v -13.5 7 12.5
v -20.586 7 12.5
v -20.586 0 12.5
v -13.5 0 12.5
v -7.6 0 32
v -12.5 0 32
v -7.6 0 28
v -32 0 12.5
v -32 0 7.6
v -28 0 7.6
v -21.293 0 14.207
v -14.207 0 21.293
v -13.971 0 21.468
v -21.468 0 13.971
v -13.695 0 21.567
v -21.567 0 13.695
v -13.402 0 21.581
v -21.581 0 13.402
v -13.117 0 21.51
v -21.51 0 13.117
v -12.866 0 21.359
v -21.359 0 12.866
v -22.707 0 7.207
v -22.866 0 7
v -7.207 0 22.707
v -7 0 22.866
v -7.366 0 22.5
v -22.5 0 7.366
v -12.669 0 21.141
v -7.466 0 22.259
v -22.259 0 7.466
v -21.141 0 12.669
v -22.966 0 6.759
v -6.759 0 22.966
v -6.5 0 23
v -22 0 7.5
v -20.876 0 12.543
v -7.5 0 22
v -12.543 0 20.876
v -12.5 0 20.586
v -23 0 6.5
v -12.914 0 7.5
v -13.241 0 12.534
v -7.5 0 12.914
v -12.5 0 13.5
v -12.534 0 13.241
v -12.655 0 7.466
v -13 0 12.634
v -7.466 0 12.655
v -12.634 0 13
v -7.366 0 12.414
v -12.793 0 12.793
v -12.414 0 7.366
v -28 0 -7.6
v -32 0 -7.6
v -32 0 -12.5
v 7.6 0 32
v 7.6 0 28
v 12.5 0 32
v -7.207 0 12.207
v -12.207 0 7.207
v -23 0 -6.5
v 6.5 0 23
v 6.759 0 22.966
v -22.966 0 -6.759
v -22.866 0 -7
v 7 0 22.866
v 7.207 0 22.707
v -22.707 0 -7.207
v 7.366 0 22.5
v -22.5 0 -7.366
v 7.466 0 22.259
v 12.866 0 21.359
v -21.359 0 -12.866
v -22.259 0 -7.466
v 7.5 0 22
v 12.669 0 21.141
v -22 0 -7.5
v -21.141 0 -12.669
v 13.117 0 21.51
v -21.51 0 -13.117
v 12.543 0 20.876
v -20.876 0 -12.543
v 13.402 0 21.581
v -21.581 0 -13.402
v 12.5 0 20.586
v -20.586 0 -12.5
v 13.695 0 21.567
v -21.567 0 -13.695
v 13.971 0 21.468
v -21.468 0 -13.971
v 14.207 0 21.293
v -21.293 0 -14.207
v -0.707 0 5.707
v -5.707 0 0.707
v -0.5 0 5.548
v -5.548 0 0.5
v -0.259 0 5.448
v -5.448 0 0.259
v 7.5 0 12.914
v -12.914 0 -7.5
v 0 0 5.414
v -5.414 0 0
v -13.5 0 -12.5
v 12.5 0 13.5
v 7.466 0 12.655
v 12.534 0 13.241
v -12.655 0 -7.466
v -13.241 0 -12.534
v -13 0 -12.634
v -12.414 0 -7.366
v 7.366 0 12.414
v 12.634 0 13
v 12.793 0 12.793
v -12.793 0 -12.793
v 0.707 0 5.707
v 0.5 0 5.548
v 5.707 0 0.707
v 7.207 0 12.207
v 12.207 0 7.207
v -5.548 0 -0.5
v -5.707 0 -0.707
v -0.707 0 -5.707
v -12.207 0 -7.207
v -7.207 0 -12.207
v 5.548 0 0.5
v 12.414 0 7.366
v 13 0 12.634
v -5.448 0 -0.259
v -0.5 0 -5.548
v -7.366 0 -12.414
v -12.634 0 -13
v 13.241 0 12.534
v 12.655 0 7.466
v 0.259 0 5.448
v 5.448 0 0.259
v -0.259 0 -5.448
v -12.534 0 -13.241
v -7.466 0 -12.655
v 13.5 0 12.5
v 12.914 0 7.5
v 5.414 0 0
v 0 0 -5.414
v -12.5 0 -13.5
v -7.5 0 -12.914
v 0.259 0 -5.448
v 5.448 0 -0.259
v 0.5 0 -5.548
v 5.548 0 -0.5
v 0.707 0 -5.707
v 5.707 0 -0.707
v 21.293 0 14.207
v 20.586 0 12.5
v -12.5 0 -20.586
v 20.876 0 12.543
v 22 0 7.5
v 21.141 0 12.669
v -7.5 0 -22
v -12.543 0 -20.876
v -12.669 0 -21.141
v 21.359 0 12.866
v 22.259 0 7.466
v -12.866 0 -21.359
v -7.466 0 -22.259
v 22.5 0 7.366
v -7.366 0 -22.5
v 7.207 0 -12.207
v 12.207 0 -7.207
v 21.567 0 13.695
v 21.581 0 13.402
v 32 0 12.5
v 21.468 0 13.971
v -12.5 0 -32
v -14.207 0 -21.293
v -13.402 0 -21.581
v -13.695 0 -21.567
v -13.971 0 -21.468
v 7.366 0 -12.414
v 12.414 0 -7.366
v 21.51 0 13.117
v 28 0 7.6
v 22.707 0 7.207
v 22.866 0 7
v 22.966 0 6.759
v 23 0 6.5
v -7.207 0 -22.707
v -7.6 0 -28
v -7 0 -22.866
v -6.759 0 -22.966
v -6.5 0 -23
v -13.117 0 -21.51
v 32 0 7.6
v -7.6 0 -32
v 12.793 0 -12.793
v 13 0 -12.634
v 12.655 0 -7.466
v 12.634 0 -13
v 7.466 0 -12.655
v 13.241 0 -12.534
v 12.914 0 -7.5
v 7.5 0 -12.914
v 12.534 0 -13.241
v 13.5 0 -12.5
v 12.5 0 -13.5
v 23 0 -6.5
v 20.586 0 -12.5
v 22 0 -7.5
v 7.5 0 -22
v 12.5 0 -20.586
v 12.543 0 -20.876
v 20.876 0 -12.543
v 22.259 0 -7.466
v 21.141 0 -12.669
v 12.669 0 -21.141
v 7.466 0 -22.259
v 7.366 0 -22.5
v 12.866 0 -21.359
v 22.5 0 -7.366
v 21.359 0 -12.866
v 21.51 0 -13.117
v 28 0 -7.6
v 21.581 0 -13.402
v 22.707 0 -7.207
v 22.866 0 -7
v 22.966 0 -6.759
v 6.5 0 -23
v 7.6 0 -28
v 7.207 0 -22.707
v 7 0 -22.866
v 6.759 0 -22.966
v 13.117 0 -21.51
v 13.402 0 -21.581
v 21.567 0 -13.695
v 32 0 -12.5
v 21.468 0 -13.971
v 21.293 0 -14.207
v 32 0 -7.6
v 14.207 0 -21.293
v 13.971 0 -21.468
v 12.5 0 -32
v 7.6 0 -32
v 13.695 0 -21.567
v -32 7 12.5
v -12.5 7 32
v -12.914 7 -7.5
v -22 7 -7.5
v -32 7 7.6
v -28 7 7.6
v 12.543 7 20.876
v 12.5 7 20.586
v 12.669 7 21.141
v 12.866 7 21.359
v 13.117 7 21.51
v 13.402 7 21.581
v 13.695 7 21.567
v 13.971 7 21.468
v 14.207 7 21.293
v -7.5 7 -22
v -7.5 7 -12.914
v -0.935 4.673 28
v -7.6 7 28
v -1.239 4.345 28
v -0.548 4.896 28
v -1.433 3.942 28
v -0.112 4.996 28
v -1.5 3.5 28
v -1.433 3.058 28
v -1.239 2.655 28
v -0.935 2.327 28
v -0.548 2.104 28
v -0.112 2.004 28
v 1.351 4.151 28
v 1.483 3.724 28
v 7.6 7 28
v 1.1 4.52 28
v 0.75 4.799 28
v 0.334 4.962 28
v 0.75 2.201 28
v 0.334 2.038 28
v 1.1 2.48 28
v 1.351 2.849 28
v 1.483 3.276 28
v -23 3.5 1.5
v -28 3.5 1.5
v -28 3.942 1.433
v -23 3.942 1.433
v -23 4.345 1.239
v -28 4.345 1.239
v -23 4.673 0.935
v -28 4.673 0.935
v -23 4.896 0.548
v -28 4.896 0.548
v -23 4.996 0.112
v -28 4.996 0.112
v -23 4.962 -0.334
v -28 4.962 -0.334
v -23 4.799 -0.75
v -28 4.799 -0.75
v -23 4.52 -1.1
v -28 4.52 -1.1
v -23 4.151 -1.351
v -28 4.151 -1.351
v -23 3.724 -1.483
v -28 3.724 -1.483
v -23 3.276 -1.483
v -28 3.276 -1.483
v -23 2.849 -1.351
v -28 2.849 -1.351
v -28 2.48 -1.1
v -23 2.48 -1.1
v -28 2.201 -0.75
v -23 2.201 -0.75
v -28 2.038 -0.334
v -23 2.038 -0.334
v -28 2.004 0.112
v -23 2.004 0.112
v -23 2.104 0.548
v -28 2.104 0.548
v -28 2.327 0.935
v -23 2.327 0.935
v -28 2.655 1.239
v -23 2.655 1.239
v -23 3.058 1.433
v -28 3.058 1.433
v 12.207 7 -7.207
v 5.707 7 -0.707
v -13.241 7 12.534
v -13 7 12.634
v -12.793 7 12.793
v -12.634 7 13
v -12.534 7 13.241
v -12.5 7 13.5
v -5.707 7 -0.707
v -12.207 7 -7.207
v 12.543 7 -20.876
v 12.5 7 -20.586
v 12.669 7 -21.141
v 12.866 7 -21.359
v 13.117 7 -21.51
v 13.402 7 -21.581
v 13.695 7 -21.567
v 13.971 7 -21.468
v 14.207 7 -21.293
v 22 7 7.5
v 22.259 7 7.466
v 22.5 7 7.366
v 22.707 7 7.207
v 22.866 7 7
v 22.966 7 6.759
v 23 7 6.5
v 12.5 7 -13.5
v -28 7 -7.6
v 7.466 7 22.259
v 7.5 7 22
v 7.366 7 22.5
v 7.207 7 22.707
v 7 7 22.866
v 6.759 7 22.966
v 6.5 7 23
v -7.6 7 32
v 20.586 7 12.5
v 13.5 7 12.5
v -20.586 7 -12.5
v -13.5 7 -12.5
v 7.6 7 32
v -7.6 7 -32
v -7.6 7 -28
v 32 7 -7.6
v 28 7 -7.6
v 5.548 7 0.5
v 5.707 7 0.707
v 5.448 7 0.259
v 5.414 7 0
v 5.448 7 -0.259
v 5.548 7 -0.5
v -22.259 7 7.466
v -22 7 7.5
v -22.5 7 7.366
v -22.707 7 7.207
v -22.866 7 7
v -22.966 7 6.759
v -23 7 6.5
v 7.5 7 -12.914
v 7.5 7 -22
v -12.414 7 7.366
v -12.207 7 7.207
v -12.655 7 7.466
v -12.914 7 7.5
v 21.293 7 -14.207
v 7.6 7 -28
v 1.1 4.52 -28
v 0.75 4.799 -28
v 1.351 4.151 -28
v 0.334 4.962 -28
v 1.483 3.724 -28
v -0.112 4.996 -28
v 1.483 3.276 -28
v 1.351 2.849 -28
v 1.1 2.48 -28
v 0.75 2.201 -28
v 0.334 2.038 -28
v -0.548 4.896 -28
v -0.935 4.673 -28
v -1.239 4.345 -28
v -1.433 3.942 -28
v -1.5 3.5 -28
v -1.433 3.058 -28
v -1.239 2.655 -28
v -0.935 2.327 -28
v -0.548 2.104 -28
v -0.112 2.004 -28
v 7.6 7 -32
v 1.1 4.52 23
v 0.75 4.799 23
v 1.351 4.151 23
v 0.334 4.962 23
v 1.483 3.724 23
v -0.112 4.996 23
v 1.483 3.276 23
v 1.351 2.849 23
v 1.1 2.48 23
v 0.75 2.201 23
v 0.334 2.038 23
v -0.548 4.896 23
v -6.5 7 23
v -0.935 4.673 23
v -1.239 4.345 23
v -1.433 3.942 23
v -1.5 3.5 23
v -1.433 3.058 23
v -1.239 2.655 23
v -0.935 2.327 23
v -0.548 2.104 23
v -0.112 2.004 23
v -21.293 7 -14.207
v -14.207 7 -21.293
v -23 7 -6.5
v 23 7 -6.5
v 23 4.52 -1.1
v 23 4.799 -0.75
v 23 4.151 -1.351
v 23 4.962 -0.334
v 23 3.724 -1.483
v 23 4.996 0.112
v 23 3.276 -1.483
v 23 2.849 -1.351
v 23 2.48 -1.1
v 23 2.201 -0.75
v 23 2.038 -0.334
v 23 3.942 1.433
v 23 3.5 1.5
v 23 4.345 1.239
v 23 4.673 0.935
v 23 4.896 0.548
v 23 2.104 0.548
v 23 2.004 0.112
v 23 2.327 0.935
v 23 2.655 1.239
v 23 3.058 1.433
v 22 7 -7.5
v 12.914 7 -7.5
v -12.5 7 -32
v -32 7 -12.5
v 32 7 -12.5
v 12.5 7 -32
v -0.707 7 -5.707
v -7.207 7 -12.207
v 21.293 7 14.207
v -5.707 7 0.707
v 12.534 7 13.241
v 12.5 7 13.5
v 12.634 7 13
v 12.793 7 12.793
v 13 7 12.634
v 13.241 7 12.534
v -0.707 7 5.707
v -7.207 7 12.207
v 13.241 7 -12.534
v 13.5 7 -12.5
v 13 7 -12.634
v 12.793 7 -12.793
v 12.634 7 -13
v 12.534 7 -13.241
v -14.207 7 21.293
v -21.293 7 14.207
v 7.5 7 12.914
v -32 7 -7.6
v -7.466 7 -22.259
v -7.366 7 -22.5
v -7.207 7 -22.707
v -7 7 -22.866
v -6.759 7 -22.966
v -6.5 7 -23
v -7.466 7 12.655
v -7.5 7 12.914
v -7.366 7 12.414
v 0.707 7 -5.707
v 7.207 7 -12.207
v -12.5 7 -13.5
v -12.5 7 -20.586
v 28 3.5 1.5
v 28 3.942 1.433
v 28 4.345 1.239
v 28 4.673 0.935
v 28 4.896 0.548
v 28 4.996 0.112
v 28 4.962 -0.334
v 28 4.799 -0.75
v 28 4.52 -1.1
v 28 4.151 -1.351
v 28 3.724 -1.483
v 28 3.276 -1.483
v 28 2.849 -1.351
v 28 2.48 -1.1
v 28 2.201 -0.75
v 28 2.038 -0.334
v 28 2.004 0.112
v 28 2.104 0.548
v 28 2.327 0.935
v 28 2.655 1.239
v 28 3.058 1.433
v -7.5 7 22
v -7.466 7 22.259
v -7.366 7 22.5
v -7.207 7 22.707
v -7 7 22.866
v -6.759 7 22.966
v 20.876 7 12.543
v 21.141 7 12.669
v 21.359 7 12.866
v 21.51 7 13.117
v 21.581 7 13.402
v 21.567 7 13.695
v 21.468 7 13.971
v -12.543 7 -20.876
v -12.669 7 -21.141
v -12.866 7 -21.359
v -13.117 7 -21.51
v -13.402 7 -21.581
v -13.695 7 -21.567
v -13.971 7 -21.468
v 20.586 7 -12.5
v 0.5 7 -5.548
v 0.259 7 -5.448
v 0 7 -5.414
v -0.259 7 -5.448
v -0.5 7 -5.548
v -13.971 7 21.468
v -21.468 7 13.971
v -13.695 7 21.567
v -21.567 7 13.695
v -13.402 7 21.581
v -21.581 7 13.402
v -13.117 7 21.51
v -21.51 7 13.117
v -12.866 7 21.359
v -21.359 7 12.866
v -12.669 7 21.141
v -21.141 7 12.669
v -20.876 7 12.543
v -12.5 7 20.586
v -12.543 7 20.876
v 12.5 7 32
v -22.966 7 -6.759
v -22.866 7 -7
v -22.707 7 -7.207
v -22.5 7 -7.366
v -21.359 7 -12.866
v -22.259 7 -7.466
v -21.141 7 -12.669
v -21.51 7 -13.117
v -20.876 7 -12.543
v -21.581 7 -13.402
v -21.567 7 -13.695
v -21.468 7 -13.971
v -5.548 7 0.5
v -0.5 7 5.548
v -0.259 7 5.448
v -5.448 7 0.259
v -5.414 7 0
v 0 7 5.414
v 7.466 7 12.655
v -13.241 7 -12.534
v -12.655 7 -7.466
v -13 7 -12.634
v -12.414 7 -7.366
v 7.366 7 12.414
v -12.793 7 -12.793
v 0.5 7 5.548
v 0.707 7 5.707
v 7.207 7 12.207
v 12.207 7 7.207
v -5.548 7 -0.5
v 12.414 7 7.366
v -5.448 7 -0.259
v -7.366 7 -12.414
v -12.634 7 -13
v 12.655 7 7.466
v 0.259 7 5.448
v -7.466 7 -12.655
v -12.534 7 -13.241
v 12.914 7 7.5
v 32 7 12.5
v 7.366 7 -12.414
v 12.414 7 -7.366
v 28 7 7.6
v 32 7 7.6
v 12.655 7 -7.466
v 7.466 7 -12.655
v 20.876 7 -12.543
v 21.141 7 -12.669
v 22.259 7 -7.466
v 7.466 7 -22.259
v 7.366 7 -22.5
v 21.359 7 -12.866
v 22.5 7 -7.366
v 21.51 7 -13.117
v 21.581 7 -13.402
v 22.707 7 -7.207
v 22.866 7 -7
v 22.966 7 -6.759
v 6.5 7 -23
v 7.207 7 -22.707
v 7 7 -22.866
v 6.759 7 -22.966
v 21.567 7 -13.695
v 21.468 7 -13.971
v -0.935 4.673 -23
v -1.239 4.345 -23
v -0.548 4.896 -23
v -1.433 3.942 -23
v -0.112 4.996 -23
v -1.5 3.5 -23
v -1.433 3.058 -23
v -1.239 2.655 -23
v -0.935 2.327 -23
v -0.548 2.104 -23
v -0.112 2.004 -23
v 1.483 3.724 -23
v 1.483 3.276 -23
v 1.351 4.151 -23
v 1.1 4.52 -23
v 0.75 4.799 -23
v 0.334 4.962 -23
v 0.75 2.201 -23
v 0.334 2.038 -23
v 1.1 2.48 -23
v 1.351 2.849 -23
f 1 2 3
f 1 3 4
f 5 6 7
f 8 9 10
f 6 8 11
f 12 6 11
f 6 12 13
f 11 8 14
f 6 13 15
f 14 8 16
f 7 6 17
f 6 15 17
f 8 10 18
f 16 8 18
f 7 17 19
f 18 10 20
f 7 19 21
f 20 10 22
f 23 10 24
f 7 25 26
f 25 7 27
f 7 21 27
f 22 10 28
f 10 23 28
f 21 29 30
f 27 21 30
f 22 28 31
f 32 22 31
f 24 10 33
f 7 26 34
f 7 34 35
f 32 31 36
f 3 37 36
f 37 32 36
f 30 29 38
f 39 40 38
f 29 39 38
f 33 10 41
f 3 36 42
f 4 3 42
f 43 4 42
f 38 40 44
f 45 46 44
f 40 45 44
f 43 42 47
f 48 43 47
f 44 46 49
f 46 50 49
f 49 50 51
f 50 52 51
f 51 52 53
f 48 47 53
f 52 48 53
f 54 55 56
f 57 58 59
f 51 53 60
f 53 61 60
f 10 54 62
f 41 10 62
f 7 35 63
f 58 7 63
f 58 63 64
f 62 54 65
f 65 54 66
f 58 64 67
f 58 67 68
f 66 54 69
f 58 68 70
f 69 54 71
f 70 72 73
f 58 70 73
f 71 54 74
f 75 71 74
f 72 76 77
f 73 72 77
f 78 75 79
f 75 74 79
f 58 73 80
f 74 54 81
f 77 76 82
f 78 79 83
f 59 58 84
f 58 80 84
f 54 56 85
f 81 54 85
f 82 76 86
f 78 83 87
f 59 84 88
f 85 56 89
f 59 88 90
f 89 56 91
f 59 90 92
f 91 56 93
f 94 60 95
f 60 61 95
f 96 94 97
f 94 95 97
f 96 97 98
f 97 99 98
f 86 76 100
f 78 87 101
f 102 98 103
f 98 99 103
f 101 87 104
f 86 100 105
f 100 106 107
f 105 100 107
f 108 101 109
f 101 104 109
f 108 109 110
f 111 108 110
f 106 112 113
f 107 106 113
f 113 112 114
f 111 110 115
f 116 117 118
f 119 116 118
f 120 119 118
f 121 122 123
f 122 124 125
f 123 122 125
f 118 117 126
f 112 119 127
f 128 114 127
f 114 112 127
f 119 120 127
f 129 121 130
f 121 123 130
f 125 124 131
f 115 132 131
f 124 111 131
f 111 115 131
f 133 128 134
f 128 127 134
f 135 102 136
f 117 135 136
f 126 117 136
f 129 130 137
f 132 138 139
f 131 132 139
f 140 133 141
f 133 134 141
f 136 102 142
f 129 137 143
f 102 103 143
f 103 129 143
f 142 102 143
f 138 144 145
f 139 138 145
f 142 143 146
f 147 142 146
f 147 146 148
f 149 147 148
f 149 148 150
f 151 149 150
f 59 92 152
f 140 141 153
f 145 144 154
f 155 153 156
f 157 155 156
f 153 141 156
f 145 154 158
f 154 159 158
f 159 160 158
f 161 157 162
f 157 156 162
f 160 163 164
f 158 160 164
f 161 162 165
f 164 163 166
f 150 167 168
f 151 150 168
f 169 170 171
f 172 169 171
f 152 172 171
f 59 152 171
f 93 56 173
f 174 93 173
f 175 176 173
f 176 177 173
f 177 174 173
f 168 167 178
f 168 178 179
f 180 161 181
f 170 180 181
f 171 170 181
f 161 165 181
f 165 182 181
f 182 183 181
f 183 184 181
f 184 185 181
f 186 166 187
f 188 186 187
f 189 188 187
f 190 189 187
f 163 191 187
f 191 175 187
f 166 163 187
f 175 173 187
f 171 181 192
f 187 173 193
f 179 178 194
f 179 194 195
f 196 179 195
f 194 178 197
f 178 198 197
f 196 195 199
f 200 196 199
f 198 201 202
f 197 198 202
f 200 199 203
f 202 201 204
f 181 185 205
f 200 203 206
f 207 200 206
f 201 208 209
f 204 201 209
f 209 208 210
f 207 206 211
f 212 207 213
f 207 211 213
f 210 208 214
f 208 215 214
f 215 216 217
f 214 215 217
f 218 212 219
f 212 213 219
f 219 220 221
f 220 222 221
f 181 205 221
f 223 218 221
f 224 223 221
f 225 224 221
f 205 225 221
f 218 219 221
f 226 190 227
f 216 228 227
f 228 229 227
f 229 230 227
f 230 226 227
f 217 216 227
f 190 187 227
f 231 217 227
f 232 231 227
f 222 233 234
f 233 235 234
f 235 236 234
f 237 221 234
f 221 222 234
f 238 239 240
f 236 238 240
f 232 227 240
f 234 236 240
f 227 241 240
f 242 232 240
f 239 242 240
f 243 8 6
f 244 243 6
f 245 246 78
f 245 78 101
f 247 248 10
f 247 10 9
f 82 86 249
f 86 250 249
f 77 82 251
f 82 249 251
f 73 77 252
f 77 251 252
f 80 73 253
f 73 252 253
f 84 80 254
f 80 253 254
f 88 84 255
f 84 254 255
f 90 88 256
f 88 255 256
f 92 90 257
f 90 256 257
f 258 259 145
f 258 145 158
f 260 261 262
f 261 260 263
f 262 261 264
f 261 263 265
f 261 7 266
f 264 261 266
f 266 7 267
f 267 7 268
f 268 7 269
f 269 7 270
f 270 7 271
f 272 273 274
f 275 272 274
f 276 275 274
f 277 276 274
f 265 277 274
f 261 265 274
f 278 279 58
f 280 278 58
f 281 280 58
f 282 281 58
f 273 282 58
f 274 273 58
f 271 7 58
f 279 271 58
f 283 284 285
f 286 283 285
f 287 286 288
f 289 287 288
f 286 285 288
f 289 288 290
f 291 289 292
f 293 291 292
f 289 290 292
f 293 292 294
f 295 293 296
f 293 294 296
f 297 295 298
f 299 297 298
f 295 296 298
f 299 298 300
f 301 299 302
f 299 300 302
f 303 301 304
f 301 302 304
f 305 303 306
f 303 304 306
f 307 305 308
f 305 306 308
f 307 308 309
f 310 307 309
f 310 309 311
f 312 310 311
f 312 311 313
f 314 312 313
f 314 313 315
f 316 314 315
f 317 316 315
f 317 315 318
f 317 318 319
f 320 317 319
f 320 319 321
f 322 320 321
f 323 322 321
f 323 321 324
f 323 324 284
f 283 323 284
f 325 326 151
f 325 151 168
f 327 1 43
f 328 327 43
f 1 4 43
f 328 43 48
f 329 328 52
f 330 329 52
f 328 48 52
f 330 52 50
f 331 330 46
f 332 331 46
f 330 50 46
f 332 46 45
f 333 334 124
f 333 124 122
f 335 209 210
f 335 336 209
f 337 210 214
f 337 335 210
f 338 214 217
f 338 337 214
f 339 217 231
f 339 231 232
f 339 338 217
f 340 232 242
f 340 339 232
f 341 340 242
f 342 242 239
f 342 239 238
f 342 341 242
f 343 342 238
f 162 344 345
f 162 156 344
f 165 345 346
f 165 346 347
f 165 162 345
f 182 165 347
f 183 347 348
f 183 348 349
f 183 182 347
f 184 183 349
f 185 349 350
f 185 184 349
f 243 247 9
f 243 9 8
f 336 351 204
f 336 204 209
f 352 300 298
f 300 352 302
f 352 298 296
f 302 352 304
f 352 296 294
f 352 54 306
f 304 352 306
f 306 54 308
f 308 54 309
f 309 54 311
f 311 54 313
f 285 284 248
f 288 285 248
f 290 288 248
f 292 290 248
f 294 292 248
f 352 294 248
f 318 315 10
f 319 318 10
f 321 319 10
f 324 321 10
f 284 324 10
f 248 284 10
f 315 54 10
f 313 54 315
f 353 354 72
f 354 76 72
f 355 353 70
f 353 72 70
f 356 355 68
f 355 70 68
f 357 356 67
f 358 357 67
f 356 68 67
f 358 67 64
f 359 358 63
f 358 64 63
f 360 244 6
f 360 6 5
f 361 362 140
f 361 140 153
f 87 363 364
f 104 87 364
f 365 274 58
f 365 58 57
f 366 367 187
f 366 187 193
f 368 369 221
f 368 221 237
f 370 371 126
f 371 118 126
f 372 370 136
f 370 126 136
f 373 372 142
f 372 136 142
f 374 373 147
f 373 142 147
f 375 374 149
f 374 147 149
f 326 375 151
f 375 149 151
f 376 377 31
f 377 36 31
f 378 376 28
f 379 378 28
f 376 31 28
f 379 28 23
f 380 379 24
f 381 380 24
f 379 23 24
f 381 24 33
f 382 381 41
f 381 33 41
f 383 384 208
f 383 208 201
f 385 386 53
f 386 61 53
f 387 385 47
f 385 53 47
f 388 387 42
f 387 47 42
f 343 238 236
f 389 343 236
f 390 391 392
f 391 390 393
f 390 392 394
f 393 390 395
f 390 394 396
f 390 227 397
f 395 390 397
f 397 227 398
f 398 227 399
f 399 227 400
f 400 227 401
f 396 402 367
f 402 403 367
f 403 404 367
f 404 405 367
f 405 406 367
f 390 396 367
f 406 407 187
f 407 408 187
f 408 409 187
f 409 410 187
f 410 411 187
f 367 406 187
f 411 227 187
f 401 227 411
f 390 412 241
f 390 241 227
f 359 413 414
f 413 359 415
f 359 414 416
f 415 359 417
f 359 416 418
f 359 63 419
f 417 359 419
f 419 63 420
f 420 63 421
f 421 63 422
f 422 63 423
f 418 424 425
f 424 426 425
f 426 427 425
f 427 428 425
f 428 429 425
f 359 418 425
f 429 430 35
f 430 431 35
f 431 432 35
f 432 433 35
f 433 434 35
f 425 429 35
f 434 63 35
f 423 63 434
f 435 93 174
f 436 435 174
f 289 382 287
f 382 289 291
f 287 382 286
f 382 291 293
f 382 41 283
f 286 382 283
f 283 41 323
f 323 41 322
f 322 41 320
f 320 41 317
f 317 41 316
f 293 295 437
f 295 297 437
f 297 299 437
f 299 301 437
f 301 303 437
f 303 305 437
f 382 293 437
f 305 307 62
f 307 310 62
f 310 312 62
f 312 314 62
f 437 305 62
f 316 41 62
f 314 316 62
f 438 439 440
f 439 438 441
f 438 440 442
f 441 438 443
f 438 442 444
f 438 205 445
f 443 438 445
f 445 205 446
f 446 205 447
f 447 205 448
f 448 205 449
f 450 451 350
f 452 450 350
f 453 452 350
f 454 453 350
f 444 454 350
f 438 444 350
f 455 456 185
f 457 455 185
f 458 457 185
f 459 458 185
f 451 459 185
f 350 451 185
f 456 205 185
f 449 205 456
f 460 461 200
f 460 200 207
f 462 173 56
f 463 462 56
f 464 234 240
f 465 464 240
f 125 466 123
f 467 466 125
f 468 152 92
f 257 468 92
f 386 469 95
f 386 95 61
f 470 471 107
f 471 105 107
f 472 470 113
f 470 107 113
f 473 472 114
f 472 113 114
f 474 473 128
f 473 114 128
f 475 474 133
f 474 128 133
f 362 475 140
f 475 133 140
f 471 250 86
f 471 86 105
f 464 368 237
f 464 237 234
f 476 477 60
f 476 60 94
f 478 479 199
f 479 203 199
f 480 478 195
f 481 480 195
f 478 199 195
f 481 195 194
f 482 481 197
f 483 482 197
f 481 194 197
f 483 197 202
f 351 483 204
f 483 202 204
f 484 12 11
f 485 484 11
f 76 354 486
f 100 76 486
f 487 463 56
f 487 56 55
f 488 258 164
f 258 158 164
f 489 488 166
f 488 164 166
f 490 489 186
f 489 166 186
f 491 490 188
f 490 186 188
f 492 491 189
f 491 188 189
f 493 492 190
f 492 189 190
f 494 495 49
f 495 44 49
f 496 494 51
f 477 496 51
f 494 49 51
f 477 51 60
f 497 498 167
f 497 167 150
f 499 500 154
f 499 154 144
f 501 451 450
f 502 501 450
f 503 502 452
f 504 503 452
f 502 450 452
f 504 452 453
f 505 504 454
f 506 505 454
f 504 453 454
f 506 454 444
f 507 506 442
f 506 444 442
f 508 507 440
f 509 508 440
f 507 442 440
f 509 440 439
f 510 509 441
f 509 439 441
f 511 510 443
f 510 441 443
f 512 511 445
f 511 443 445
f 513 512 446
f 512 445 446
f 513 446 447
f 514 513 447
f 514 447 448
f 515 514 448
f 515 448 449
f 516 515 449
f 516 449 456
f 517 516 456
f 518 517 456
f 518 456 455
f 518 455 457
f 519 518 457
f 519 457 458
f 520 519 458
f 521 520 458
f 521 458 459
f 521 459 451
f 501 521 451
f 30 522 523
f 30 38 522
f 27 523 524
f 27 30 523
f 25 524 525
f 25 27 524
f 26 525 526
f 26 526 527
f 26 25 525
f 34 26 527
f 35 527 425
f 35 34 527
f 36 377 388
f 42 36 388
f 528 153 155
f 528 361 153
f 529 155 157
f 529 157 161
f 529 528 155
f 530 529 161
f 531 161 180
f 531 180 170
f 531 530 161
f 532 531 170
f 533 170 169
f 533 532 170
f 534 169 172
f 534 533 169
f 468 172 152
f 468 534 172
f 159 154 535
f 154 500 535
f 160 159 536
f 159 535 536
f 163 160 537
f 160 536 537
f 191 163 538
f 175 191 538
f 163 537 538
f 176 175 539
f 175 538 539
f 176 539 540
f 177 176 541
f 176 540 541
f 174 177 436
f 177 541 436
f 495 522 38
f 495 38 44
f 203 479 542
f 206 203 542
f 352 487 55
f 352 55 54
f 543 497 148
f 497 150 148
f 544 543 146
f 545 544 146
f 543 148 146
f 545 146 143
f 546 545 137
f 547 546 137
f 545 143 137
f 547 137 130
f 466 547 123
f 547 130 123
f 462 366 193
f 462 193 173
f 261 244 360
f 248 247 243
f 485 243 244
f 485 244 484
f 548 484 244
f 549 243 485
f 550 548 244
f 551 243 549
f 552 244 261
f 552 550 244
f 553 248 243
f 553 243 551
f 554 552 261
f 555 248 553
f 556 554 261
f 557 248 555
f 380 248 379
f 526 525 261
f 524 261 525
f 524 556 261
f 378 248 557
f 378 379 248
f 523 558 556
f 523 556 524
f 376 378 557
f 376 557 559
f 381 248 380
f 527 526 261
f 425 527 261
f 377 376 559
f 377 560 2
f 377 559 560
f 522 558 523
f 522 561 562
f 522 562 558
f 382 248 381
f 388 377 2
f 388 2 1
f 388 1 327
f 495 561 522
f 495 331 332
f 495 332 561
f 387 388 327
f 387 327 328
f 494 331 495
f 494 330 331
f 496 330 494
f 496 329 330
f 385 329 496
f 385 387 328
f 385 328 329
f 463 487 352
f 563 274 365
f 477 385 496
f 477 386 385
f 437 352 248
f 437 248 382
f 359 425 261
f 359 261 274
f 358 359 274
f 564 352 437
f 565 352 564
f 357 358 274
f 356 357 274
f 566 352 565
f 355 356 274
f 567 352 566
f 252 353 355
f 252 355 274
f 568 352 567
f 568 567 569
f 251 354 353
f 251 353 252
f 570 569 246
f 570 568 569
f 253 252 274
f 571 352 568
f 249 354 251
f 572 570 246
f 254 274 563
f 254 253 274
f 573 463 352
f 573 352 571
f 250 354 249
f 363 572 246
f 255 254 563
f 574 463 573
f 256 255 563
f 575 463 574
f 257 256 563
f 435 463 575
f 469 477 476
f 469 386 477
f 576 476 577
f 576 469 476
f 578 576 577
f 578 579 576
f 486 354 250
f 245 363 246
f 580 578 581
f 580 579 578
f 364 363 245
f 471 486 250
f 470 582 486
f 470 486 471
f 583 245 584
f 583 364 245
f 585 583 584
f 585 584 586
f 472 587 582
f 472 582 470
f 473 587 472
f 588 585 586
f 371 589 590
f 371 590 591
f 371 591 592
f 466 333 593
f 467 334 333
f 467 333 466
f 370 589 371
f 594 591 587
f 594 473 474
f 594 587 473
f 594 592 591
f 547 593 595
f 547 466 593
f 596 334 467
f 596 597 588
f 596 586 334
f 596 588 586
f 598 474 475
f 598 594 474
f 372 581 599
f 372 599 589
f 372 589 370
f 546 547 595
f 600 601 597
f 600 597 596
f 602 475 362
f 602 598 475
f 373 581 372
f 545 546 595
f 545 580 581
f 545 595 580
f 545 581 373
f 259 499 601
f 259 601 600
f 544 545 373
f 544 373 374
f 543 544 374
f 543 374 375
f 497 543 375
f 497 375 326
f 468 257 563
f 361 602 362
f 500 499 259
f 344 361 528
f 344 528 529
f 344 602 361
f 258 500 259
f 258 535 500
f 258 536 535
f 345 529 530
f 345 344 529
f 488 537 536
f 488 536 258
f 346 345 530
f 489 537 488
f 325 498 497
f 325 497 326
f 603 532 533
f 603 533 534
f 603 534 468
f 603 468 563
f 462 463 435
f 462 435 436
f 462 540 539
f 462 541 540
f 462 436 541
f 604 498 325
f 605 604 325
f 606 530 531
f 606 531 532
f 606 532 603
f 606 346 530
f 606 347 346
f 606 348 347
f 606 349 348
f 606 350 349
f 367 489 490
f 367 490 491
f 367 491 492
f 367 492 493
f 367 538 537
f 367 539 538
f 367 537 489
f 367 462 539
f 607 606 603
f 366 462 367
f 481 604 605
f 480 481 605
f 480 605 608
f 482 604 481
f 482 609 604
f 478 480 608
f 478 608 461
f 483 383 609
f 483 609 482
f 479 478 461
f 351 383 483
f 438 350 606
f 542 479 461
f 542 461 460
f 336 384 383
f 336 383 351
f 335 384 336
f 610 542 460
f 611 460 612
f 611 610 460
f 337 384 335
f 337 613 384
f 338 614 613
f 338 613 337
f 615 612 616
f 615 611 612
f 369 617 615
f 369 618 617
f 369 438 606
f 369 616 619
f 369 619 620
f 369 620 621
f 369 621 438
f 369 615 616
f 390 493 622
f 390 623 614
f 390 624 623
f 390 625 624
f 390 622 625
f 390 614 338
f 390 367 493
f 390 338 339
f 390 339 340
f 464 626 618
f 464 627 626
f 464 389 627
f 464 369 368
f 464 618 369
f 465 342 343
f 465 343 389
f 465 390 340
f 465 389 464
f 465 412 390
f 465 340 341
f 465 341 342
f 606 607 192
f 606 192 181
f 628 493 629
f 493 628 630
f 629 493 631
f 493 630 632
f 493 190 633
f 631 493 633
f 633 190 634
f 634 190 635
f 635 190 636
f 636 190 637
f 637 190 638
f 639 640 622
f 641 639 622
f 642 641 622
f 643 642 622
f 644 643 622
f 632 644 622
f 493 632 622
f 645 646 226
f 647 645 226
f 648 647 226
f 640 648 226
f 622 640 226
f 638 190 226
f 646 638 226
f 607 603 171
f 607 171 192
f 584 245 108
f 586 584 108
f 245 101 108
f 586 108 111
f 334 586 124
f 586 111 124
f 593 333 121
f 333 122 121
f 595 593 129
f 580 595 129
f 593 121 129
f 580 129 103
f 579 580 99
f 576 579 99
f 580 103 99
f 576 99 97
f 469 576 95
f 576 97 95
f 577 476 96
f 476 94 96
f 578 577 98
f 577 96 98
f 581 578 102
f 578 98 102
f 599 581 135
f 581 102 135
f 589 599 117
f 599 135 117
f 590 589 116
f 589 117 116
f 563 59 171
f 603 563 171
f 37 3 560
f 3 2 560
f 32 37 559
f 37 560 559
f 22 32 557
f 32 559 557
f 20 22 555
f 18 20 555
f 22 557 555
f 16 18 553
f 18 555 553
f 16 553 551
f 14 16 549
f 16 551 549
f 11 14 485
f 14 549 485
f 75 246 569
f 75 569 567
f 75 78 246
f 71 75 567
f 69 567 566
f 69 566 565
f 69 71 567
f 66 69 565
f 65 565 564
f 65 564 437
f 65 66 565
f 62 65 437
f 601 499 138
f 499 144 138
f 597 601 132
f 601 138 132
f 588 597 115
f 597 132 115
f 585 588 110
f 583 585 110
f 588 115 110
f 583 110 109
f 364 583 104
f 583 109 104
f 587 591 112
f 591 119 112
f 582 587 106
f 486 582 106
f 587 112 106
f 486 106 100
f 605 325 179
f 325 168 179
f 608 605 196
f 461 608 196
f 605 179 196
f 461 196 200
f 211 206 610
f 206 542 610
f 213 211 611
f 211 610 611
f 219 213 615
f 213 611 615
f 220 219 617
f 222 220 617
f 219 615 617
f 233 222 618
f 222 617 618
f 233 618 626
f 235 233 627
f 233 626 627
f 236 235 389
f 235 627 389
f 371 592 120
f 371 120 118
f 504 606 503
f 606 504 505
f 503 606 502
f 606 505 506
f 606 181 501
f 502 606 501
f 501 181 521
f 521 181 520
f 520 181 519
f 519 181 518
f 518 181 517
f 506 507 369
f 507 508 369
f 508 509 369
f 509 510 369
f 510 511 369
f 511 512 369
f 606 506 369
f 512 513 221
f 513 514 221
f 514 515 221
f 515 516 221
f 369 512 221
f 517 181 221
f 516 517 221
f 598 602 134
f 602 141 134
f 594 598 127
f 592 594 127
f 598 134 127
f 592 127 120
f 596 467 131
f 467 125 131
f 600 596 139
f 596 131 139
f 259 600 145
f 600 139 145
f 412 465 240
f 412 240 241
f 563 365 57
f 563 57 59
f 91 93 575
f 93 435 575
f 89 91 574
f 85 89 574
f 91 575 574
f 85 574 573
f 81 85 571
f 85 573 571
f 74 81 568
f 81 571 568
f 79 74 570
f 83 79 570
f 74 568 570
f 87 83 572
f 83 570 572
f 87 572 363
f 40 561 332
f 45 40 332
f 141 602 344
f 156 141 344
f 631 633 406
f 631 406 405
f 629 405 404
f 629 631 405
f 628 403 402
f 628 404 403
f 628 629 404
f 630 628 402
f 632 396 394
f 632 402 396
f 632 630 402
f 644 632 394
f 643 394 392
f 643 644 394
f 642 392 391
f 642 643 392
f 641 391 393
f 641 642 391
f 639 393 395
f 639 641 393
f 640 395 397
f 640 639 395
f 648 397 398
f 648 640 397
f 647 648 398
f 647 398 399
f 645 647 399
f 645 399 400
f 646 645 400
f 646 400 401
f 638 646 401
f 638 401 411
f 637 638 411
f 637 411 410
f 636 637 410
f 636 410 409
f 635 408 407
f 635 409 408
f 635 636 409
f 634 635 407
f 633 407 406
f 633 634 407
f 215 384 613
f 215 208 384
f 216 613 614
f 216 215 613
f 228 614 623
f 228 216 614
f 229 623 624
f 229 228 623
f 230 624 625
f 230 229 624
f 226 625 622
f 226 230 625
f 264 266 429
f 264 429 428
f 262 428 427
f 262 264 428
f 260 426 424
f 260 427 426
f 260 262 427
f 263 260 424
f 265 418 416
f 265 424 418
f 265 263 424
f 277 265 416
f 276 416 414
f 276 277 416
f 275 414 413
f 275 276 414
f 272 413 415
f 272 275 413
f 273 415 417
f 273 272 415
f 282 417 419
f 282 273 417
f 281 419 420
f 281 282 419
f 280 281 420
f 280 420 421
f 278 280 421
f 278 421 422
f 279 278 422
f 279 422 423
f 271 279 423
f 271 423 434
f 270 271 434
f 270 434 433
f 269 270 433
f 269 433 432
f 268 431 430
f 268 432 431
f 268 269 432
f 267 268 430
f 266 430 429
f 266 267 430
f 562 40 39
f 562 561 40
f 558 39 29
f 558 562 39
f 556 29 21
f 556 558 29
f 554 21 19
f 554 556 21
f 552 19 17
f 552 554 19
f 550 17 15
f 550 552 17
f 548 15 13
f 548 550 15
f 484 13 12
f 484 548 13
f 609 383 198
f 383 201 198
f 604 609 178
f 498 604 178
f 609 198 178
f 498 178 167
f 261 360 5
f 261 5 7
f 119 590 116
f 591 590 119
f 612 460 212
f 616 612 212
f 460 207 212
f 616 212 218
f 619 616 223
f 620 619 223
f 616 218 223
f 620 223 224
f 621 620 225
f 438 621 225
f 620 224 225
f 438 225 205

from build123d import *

# Parameters (mm, degrees)
EXTRUDE_1_DEPTH          = 7
CUT_EXTRUDE_1_DEPTH      = 69.359344643
CUT_EXTRUDE_1_DEPTH_BACK = 69.359344643
SKETCH_2_R               = 1.5
SKETCH_3_R               = 1.5
CUT_EXTRUDE_2_DEPTH      = 69.359344643
SKETCH_4_W               = 5
SKETCH_4_H               = 10.5
SKETCH_4_W_2             = 10.5
SKETCH_4_H_2             = 5
EXTRUDE_2_DEPTH          = 7
FILLET_1_R               = 1


with BuildPart() as part:
    # 草图1 → 凸台-拉伸1 (new body)
    with BuildSketch(Plane(origin=(0, 0, 0), x_dir=(1, 0, 0), z_dir=(0, 1, 0))):
        Polygon((-7.6, 28), (-7.6, 32), (-12.5, 32), (-32, 12.5), (-32, 7.6), (-28, 7.6), (-28, -7.6), (-32, -7.6), (-32, -12.5), (-12.5, -32), (-7.6, -32), (-7.6, -28), (7.6, -28), (7.6, -32), (12.5, -32), (32, -12.5), (32, -7.6), (28, -7.6), (28, 7.6), (32, 7.6), (32, 12.5), (12.5, 32), (7.6, 32), (7.6, 28), align=None)
        Polygon((-12.5, 23), (0, 23), (12.5, 23), (23, 12.5), (23, 0), (23, -12.5), (12.5, -23), (0, -23), (-12.5, -23), (-23, -12.5), (-23, 0), (-23, 12.5), align=None, mode=Mode.SUBTRACT)
    extrude(amount=EXTRUDE_1_DEPTH)

    # 草图2 → 切除-拉伸1 (cut, two sides: drawn at the far end of the back side and taken through both)
    with BuildSketch(Plane(origin=(0, 0, -28), x_dir=(-1, 0, 0), z_dir=(0, 0, -1)).offset(-CUT_EXTRUDE_1_DEPTH_BACK)):
        with Locations((0, 3.5)):
            Circle(SKETCH_2_R)
    extrude(amount=CUT_EXTRUDE_1_DEPTH + CUT_EXTRUDE_1_DEPTH_BACK, mode=Mode.SUBTRACT)

    # 草图3 → 切除-拉伸2 (cut, through all)
    with BuildSketch(Plane.ZY.offset(28)):
        with Locations((0, 3.5)):
            Circle(SKETCH_3_R)
    extrude(amount=-CUT_EXTRUDE_2_DEPTH, mode=Mode.SUBTRACT)

    # 草图4 → 凸台-拉伸2 (add)
    with BuildSketch(Plane(origin=(0, 7, 0), x_dir=(1, 0, 0), z_dir=(0, 1, 0))):
        with Locations((-10, 17.75)):
            Rectangle(SKETCH_4_W, SKETCH_4_H)
        Polygon((-12.5, 12.5), (-12.5, 7.5), (-7.5, 12.5), align=None)
        with Locations((-17.75, 10)):
            Rectangle(SKETCH_4_W_2, SKETCH_4_H_2)
        Polygon((-7.5, 12.5), (-12.5, 7.5), (-7.5, 7.5), align=None)
        Polygon((-7.5, 12.5), (-7.5, 7.5), (-2.5, 7.5), align=None)
        Polygon((-2.5, 7.5), (-7.5, 7.5), (-7.5, 2.5), (-5, 0), (0, 5), align=None)
        Polygon((-7.5, 7.5), (-12.5, 7.5), (-7.5, 2.5), align=None)
        Polygon((0, 5), (-5, 0), (0, -5), (5, 0), align=None)
        Polygon((5, 0), (0, -5), (2.5, -7.5), (7.5, -7.5), (7.5, -2.5), align=None)
        Polygon((7.5, -2.5), (7.5, -7.5), (12.5, -7.5), align=None)
        Polygon((7.5, -7.5), (7.5, -12.5), (12.5, -7.5), align=None)
        Polygon((2.5, -7.5), (7.5, -12.5), (7.5, -7.5), align=None)
        Polygon((12.5, -7.5), (7.5, -12.5), (12.5, -12.5), align=None)
        with Locations((17.75, -10)):
            Rectangle(SKETCH_4_W_2, SKETCH_4_H_2)
        with Locations((10, -17.75)):
            Rectangle(SKETCH_4_W, SKETCH_4_H)
        Polygon((12.5, 12.5), (7.5, 12.5), (12.5, 7.5), align=None)
        with Locations((10, 17.75)):
            Rectangle(SKETCH_4_W, SKETCH_4_H)
        with Locations((17.75, 10)):
            Rectangle(SKETCH_4_W_2, SKETCH_4_H_2)
        Polygon((12.5, 7.5), (7.5, 12.5), (7.5, 7.5), align=None)
        Polygon((12.5, 7.5), (7.5, 7.5), (7.5, 2.5), align=None)
        Polygon((7.5, 7.5), (7.5, 12.5), (2.5, 7.5), align=None)
        Polygon((7.5, 7.5), (2.5, 7.5), (0, 5), (5, 0), (7.5, 2.5), align=None)
        Polygon((-7.5, -2.5), (-7.5, -7.5), (-2.5, -7.5), (0, -5), (-5, 0), align=None)
        Polygon((-7.5, -2.5), (-12.5, -7.5), (-7.5, -7.5), align=None)
        Polygon((-2.5, -7.5), (-7.5, -7.5), (-7.5, -12.5), align=None)
        Polygon((-7.5, -7.5), (-12.5, -7.5), (-7.5, -12.5), align=None)
        Polygon((-7.5, -12.5), (-12.5, -7.5), (-12.5, -12.5), align=None)
        with Locations((-17.75, -10)):
            Rectangle(SKETCH_4_W_2, SKETCH_4_H_2)
        with Locations((-10, -17.75)):
            Rectangle(SKETCH_4_W, SKETCH_4_H)
    extrude(amount=-EXTRUDE_2_DEPTH)

    # 圆角1
    fillet_1_edges = [part.edges().sort_by_distance(p)[0] for p in [
        (7.5, 3.5, 12.5),
        (0, 3.5, 5),
        (-7.5, 3.5, 12.5),
        (-7.5, 3.5, 23),
        (-12.5, 3.5, 12.5),
        (-23, 3.5, 7.5),
        (-12.5, 3.5, 7.5),
        (-5, 3.5, 0),
        (-12.5, 3.5, -7.5),
        (-23, 3.5, -7.5),
        (-12.5, 3.5, -12.5),
        (-7.5, 3.5, -23),
        (-7.5, 3.5, -12.5),
        (0, 3.5, -5),
        (7.5, 3.5, -12.5),
        (7.5, 3.5, -23),
        (12.5, 3.5, -12.5),
        (23, 3.5, -7.5),
        (12.5, 3.5, -7.5),
        (5, 3.5, 0),
        (12.5, 3.5, 7.5),
        (23, 3.5, 7.5),
        (12.5, 3.5, 12.5),
        (7.5, 3.5, 23),
        (12.5, 3.5, 23),
        (23, 3.5, 12.5),
        (23, 3.5, -12.5),
        (12.5, 3.5, -23),
        (-12.5, 3.5, -23),
        (-23, 3.5, -12.5),
        (-23, 3.5, 12.5),
        (-12.5, 3.5, 23),
    ]]
    fillet(fillet_1_edges, radius=FILLET_1_R)


solid = part.part
